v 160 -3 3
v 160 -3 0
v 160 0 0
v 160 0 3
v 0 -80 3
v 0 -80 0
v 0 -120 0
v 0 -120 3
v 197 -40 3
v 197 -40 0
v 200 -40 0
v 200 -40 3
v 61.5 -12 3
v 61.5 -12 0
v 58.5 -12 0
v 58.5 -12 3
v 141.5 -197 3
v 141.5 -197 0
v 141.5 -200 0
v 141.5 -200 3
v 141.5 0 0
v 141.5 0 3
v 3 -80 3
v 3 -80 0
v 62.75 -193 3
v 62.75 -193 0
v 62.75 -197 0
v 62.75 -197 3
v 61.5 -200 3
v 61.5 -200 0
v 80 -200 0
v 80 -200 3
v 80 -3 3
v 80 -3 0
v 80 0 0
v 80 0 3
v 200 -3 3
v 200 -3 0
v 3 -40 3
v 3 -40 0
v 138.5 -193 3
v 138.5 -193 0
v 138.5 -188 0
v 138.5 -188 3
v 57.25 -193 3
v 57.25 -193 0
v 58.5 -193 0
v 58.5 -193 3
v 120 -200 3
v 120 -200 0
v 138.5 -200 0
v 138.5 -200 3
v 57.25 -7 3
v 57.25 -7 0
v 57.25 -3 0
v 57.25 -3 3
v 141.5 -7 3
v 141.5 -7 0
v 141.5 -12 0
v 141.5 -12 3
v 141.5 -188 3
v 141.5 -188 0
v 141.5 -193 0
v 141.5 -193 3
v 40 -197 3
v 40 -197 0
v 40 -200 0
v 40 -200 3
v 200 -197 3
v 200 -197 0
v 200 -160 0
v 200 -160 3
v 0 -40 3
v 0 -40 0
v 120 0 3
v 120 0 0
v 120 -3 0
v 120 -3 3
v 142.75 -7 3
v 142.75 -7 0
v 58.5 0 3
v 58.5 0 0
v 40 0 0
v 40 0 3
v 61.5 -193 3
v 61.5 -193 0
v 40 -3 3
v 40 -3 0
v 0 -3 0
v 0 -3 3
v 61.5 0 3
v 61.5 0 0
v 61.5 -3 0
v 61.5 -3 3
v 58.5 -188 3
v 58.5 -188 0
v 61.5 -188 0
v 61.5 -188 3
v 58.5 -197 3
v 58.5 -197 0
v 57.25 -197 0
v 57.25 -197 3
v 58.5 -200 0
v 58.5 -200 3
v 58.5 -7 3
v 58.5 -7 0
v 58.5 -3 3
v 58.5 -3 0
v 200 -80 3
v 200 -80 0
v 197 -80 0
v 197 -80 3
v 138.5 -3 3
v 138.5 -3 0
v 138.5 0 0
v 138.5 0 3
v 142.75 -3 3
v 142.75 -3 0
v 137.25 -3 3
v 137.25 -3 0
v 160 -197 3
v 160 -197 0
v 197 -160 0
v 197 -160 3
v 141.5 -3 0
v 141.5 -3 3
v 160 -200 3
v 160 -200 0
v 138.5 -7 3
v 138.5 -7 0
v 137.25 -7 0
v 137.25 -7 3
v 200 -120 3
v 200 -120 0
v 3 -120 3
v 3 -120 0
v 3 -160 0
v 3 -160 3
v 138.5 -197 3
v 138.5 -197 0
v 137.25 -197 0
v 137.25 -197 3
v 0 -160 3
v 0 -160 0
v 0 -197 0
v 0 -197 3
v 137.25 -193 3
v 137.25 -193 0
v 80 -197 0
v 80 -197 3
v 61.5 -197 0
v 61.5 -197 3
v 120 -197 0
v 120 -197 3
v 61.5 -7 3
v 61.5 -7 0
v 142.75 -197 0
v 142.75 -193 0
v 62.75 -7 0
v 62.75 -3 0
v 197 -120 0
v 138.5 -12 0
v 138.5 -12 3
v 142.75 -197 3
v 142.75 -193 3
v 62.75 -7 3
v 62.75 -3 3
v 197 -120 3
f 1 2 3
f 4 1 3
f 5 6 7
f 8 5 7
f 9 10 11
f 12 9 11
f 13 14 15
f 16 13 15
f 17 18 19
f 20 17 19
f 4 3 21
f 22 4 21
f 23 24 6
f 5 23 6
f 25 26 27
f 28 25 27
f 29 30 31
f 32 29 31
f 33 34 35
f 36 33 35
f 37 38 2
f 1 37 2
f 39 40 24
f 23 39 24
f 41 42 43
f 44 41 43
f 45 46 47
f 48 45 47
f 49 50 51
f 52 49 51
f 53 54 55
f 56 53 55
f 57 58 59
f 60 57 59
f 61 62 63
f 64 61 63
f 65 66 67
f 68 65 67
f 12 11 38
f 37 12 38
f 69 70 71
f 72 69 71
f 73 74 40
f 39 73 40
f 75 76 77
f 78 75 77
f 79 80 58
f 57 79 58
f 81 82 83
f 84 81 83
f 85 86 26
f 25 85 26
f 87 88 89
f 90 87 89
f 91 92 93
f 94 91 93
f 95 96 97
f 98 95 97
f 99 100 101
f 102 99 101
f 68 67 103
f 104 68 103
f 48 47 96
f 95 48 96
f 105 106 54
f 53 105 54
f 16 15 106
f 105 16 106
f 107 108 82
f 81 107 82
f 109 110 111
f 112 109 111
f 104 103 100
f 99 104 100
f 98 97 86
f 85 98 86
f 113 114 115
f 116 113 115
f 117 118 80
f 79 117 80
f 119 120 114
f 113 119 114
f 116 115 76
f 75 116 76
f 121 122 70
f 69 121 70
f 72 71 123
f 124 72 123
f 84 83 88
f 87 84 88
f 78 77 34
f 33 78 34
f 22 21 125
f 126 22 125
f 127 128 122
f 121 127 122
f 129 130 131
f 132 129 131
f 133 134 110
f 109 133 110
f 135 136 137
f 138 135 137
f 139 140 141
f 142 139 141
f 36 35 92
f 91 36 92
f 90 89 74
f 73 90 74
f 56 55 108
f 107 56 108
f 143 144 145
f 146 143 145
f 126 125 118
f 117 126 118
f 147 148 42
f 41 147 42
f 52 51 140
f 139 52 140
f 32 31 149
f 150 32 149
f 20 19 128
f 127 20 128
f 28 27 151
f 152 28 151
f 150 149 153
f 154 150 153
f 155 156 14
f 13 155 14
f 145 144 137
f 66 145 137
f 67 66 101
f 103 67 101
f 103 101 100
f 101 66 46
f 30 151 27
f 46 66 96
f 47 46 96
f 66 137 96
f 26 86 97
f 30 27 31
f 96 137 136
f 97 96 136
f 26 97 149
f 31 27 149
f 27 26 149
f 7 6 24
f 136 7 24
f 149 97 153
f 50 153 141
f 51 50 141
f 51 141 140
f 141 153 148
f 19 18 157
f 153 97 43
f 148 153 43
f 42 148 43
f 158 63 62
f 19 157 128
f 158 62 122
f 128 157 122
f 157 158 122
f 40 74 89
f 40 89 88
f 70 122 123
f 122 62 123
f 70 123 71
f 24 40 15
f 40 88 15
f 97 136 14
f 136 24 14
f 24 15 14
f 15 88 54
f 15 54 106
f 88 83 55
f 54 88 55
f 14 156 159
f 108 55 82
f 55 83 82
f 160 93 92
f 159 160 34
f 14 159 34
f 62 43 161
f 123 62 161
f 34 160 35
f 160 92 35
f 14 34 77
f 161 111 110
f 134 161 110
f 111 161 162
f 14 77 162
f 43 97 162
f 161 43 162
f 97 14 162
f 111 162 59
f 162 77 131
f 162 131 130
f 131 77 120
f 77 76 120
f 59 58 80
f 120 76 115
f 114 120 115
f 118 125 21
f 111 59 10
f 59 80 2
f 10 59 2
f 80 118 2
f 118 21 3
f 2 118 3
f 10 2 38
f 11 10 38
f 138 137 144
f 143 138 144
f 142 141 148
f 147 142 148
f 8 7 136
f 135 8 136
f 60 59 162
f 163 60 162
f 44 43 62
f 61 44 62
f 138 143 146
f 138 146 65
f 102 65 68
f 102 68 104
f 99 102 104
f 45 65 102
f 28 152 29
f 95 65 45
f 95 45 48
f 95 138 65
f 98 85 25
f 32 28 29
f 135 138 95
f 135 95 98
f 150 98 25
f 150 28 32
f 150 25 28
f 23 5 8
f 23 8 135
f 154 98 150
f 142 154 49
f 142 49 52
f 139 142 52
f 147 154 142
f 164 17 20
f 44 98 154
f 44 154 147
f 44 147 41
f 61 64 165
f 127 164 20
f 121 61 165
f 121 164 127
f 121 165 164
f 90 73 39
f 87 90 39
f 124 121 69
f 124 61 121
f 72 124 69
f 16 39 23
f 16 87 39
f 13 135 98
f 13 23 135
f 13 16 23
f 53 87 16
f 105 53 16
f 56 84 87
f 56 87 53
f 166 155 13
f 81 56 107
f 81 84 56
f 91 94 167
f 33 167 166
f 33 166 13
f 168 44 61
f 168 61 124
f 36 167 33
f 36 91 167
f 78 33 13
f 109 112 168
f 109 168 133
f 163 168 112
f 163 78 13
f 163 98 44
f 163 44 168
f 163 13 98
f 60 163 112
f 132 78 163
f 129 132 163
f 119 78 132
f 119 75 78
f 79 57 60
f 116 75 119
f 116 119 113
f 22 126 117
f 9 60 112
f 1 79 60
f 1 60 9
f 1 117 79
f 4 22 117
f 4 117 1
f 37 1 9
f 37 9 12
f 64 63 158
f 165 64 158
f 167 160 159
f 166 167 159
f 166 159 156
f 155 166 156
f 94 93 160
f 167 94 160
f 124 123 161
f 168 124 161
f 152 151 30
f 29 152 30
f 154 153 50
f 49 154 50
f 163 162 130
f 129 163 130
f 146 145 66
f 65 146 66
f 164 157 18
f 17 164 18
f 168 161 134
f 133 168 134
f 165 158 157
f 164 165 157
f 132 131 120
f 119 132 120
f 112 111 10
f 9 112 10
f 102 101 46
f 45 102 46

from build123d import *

# Parameters (mm, degrees)
EXTRUDE_1_DEPTH = 3


with BuildPart() as part:
    # 草图1 → 凸台-拉伸1 (new body)
    with BuildSketch(Plane.XY):
        Polygon((120, -3), (80, -3), (80, 0), (61.5, 0), (61.5, -3), (62.75, -3), (62.75, -7), (61.5, -7), (61.5, -12), (58.5, -12), (58.5, -7), (57.25, -7), (57.25, -3), (58.5, -3), (58.5, 0), (40, 0), (40, -3), (0, -3), (0, -40), (3, -40), (3, -80), (0, -80), (0, -120), (3, -120), (3, -160), (0, -160), (0, -197), (40, -197), (40, -200), (58.5, -200), (58.5, -197), (57.25, -197), (57.25, -193), (58.5, -193), (58.5, -188), (61.5, -188), (61.5, -193), (62.75, -193), (62.75, -197), (61.5, -197), (61.5, -200), (80, -200), (80, -197), (120, -197), (120, -200), (138.5, -200), (138.5, -197), (137.25, -197), (137.25, -193), (138.5, -193), (138.5, -188), (141.5, -188), (141.5, -193), (142.75, -193), (142.75, -197), (141.5, -197), (141.5, -200), (160, -200), (160, -197), (200, -197), (200, -160), (197, -160), (197, -120), (200, -120), (200, -80), (197, -80), (197, -40), (200, -40), (200, -3), (160, -3), (160, 0), (141.5, 0), (141.5, -3), (142.75, -3), (142.75, -7), (141.5, -7), (141.5, -12), (138.5, -12), (138.5, -7), (137.25, -7), (137.25, -3), (138.5, -3), (138.5, 0), (120, 0), align=None)
    extrude(amount=EXTRUDE_1_DEPTH)


solid = part.part
